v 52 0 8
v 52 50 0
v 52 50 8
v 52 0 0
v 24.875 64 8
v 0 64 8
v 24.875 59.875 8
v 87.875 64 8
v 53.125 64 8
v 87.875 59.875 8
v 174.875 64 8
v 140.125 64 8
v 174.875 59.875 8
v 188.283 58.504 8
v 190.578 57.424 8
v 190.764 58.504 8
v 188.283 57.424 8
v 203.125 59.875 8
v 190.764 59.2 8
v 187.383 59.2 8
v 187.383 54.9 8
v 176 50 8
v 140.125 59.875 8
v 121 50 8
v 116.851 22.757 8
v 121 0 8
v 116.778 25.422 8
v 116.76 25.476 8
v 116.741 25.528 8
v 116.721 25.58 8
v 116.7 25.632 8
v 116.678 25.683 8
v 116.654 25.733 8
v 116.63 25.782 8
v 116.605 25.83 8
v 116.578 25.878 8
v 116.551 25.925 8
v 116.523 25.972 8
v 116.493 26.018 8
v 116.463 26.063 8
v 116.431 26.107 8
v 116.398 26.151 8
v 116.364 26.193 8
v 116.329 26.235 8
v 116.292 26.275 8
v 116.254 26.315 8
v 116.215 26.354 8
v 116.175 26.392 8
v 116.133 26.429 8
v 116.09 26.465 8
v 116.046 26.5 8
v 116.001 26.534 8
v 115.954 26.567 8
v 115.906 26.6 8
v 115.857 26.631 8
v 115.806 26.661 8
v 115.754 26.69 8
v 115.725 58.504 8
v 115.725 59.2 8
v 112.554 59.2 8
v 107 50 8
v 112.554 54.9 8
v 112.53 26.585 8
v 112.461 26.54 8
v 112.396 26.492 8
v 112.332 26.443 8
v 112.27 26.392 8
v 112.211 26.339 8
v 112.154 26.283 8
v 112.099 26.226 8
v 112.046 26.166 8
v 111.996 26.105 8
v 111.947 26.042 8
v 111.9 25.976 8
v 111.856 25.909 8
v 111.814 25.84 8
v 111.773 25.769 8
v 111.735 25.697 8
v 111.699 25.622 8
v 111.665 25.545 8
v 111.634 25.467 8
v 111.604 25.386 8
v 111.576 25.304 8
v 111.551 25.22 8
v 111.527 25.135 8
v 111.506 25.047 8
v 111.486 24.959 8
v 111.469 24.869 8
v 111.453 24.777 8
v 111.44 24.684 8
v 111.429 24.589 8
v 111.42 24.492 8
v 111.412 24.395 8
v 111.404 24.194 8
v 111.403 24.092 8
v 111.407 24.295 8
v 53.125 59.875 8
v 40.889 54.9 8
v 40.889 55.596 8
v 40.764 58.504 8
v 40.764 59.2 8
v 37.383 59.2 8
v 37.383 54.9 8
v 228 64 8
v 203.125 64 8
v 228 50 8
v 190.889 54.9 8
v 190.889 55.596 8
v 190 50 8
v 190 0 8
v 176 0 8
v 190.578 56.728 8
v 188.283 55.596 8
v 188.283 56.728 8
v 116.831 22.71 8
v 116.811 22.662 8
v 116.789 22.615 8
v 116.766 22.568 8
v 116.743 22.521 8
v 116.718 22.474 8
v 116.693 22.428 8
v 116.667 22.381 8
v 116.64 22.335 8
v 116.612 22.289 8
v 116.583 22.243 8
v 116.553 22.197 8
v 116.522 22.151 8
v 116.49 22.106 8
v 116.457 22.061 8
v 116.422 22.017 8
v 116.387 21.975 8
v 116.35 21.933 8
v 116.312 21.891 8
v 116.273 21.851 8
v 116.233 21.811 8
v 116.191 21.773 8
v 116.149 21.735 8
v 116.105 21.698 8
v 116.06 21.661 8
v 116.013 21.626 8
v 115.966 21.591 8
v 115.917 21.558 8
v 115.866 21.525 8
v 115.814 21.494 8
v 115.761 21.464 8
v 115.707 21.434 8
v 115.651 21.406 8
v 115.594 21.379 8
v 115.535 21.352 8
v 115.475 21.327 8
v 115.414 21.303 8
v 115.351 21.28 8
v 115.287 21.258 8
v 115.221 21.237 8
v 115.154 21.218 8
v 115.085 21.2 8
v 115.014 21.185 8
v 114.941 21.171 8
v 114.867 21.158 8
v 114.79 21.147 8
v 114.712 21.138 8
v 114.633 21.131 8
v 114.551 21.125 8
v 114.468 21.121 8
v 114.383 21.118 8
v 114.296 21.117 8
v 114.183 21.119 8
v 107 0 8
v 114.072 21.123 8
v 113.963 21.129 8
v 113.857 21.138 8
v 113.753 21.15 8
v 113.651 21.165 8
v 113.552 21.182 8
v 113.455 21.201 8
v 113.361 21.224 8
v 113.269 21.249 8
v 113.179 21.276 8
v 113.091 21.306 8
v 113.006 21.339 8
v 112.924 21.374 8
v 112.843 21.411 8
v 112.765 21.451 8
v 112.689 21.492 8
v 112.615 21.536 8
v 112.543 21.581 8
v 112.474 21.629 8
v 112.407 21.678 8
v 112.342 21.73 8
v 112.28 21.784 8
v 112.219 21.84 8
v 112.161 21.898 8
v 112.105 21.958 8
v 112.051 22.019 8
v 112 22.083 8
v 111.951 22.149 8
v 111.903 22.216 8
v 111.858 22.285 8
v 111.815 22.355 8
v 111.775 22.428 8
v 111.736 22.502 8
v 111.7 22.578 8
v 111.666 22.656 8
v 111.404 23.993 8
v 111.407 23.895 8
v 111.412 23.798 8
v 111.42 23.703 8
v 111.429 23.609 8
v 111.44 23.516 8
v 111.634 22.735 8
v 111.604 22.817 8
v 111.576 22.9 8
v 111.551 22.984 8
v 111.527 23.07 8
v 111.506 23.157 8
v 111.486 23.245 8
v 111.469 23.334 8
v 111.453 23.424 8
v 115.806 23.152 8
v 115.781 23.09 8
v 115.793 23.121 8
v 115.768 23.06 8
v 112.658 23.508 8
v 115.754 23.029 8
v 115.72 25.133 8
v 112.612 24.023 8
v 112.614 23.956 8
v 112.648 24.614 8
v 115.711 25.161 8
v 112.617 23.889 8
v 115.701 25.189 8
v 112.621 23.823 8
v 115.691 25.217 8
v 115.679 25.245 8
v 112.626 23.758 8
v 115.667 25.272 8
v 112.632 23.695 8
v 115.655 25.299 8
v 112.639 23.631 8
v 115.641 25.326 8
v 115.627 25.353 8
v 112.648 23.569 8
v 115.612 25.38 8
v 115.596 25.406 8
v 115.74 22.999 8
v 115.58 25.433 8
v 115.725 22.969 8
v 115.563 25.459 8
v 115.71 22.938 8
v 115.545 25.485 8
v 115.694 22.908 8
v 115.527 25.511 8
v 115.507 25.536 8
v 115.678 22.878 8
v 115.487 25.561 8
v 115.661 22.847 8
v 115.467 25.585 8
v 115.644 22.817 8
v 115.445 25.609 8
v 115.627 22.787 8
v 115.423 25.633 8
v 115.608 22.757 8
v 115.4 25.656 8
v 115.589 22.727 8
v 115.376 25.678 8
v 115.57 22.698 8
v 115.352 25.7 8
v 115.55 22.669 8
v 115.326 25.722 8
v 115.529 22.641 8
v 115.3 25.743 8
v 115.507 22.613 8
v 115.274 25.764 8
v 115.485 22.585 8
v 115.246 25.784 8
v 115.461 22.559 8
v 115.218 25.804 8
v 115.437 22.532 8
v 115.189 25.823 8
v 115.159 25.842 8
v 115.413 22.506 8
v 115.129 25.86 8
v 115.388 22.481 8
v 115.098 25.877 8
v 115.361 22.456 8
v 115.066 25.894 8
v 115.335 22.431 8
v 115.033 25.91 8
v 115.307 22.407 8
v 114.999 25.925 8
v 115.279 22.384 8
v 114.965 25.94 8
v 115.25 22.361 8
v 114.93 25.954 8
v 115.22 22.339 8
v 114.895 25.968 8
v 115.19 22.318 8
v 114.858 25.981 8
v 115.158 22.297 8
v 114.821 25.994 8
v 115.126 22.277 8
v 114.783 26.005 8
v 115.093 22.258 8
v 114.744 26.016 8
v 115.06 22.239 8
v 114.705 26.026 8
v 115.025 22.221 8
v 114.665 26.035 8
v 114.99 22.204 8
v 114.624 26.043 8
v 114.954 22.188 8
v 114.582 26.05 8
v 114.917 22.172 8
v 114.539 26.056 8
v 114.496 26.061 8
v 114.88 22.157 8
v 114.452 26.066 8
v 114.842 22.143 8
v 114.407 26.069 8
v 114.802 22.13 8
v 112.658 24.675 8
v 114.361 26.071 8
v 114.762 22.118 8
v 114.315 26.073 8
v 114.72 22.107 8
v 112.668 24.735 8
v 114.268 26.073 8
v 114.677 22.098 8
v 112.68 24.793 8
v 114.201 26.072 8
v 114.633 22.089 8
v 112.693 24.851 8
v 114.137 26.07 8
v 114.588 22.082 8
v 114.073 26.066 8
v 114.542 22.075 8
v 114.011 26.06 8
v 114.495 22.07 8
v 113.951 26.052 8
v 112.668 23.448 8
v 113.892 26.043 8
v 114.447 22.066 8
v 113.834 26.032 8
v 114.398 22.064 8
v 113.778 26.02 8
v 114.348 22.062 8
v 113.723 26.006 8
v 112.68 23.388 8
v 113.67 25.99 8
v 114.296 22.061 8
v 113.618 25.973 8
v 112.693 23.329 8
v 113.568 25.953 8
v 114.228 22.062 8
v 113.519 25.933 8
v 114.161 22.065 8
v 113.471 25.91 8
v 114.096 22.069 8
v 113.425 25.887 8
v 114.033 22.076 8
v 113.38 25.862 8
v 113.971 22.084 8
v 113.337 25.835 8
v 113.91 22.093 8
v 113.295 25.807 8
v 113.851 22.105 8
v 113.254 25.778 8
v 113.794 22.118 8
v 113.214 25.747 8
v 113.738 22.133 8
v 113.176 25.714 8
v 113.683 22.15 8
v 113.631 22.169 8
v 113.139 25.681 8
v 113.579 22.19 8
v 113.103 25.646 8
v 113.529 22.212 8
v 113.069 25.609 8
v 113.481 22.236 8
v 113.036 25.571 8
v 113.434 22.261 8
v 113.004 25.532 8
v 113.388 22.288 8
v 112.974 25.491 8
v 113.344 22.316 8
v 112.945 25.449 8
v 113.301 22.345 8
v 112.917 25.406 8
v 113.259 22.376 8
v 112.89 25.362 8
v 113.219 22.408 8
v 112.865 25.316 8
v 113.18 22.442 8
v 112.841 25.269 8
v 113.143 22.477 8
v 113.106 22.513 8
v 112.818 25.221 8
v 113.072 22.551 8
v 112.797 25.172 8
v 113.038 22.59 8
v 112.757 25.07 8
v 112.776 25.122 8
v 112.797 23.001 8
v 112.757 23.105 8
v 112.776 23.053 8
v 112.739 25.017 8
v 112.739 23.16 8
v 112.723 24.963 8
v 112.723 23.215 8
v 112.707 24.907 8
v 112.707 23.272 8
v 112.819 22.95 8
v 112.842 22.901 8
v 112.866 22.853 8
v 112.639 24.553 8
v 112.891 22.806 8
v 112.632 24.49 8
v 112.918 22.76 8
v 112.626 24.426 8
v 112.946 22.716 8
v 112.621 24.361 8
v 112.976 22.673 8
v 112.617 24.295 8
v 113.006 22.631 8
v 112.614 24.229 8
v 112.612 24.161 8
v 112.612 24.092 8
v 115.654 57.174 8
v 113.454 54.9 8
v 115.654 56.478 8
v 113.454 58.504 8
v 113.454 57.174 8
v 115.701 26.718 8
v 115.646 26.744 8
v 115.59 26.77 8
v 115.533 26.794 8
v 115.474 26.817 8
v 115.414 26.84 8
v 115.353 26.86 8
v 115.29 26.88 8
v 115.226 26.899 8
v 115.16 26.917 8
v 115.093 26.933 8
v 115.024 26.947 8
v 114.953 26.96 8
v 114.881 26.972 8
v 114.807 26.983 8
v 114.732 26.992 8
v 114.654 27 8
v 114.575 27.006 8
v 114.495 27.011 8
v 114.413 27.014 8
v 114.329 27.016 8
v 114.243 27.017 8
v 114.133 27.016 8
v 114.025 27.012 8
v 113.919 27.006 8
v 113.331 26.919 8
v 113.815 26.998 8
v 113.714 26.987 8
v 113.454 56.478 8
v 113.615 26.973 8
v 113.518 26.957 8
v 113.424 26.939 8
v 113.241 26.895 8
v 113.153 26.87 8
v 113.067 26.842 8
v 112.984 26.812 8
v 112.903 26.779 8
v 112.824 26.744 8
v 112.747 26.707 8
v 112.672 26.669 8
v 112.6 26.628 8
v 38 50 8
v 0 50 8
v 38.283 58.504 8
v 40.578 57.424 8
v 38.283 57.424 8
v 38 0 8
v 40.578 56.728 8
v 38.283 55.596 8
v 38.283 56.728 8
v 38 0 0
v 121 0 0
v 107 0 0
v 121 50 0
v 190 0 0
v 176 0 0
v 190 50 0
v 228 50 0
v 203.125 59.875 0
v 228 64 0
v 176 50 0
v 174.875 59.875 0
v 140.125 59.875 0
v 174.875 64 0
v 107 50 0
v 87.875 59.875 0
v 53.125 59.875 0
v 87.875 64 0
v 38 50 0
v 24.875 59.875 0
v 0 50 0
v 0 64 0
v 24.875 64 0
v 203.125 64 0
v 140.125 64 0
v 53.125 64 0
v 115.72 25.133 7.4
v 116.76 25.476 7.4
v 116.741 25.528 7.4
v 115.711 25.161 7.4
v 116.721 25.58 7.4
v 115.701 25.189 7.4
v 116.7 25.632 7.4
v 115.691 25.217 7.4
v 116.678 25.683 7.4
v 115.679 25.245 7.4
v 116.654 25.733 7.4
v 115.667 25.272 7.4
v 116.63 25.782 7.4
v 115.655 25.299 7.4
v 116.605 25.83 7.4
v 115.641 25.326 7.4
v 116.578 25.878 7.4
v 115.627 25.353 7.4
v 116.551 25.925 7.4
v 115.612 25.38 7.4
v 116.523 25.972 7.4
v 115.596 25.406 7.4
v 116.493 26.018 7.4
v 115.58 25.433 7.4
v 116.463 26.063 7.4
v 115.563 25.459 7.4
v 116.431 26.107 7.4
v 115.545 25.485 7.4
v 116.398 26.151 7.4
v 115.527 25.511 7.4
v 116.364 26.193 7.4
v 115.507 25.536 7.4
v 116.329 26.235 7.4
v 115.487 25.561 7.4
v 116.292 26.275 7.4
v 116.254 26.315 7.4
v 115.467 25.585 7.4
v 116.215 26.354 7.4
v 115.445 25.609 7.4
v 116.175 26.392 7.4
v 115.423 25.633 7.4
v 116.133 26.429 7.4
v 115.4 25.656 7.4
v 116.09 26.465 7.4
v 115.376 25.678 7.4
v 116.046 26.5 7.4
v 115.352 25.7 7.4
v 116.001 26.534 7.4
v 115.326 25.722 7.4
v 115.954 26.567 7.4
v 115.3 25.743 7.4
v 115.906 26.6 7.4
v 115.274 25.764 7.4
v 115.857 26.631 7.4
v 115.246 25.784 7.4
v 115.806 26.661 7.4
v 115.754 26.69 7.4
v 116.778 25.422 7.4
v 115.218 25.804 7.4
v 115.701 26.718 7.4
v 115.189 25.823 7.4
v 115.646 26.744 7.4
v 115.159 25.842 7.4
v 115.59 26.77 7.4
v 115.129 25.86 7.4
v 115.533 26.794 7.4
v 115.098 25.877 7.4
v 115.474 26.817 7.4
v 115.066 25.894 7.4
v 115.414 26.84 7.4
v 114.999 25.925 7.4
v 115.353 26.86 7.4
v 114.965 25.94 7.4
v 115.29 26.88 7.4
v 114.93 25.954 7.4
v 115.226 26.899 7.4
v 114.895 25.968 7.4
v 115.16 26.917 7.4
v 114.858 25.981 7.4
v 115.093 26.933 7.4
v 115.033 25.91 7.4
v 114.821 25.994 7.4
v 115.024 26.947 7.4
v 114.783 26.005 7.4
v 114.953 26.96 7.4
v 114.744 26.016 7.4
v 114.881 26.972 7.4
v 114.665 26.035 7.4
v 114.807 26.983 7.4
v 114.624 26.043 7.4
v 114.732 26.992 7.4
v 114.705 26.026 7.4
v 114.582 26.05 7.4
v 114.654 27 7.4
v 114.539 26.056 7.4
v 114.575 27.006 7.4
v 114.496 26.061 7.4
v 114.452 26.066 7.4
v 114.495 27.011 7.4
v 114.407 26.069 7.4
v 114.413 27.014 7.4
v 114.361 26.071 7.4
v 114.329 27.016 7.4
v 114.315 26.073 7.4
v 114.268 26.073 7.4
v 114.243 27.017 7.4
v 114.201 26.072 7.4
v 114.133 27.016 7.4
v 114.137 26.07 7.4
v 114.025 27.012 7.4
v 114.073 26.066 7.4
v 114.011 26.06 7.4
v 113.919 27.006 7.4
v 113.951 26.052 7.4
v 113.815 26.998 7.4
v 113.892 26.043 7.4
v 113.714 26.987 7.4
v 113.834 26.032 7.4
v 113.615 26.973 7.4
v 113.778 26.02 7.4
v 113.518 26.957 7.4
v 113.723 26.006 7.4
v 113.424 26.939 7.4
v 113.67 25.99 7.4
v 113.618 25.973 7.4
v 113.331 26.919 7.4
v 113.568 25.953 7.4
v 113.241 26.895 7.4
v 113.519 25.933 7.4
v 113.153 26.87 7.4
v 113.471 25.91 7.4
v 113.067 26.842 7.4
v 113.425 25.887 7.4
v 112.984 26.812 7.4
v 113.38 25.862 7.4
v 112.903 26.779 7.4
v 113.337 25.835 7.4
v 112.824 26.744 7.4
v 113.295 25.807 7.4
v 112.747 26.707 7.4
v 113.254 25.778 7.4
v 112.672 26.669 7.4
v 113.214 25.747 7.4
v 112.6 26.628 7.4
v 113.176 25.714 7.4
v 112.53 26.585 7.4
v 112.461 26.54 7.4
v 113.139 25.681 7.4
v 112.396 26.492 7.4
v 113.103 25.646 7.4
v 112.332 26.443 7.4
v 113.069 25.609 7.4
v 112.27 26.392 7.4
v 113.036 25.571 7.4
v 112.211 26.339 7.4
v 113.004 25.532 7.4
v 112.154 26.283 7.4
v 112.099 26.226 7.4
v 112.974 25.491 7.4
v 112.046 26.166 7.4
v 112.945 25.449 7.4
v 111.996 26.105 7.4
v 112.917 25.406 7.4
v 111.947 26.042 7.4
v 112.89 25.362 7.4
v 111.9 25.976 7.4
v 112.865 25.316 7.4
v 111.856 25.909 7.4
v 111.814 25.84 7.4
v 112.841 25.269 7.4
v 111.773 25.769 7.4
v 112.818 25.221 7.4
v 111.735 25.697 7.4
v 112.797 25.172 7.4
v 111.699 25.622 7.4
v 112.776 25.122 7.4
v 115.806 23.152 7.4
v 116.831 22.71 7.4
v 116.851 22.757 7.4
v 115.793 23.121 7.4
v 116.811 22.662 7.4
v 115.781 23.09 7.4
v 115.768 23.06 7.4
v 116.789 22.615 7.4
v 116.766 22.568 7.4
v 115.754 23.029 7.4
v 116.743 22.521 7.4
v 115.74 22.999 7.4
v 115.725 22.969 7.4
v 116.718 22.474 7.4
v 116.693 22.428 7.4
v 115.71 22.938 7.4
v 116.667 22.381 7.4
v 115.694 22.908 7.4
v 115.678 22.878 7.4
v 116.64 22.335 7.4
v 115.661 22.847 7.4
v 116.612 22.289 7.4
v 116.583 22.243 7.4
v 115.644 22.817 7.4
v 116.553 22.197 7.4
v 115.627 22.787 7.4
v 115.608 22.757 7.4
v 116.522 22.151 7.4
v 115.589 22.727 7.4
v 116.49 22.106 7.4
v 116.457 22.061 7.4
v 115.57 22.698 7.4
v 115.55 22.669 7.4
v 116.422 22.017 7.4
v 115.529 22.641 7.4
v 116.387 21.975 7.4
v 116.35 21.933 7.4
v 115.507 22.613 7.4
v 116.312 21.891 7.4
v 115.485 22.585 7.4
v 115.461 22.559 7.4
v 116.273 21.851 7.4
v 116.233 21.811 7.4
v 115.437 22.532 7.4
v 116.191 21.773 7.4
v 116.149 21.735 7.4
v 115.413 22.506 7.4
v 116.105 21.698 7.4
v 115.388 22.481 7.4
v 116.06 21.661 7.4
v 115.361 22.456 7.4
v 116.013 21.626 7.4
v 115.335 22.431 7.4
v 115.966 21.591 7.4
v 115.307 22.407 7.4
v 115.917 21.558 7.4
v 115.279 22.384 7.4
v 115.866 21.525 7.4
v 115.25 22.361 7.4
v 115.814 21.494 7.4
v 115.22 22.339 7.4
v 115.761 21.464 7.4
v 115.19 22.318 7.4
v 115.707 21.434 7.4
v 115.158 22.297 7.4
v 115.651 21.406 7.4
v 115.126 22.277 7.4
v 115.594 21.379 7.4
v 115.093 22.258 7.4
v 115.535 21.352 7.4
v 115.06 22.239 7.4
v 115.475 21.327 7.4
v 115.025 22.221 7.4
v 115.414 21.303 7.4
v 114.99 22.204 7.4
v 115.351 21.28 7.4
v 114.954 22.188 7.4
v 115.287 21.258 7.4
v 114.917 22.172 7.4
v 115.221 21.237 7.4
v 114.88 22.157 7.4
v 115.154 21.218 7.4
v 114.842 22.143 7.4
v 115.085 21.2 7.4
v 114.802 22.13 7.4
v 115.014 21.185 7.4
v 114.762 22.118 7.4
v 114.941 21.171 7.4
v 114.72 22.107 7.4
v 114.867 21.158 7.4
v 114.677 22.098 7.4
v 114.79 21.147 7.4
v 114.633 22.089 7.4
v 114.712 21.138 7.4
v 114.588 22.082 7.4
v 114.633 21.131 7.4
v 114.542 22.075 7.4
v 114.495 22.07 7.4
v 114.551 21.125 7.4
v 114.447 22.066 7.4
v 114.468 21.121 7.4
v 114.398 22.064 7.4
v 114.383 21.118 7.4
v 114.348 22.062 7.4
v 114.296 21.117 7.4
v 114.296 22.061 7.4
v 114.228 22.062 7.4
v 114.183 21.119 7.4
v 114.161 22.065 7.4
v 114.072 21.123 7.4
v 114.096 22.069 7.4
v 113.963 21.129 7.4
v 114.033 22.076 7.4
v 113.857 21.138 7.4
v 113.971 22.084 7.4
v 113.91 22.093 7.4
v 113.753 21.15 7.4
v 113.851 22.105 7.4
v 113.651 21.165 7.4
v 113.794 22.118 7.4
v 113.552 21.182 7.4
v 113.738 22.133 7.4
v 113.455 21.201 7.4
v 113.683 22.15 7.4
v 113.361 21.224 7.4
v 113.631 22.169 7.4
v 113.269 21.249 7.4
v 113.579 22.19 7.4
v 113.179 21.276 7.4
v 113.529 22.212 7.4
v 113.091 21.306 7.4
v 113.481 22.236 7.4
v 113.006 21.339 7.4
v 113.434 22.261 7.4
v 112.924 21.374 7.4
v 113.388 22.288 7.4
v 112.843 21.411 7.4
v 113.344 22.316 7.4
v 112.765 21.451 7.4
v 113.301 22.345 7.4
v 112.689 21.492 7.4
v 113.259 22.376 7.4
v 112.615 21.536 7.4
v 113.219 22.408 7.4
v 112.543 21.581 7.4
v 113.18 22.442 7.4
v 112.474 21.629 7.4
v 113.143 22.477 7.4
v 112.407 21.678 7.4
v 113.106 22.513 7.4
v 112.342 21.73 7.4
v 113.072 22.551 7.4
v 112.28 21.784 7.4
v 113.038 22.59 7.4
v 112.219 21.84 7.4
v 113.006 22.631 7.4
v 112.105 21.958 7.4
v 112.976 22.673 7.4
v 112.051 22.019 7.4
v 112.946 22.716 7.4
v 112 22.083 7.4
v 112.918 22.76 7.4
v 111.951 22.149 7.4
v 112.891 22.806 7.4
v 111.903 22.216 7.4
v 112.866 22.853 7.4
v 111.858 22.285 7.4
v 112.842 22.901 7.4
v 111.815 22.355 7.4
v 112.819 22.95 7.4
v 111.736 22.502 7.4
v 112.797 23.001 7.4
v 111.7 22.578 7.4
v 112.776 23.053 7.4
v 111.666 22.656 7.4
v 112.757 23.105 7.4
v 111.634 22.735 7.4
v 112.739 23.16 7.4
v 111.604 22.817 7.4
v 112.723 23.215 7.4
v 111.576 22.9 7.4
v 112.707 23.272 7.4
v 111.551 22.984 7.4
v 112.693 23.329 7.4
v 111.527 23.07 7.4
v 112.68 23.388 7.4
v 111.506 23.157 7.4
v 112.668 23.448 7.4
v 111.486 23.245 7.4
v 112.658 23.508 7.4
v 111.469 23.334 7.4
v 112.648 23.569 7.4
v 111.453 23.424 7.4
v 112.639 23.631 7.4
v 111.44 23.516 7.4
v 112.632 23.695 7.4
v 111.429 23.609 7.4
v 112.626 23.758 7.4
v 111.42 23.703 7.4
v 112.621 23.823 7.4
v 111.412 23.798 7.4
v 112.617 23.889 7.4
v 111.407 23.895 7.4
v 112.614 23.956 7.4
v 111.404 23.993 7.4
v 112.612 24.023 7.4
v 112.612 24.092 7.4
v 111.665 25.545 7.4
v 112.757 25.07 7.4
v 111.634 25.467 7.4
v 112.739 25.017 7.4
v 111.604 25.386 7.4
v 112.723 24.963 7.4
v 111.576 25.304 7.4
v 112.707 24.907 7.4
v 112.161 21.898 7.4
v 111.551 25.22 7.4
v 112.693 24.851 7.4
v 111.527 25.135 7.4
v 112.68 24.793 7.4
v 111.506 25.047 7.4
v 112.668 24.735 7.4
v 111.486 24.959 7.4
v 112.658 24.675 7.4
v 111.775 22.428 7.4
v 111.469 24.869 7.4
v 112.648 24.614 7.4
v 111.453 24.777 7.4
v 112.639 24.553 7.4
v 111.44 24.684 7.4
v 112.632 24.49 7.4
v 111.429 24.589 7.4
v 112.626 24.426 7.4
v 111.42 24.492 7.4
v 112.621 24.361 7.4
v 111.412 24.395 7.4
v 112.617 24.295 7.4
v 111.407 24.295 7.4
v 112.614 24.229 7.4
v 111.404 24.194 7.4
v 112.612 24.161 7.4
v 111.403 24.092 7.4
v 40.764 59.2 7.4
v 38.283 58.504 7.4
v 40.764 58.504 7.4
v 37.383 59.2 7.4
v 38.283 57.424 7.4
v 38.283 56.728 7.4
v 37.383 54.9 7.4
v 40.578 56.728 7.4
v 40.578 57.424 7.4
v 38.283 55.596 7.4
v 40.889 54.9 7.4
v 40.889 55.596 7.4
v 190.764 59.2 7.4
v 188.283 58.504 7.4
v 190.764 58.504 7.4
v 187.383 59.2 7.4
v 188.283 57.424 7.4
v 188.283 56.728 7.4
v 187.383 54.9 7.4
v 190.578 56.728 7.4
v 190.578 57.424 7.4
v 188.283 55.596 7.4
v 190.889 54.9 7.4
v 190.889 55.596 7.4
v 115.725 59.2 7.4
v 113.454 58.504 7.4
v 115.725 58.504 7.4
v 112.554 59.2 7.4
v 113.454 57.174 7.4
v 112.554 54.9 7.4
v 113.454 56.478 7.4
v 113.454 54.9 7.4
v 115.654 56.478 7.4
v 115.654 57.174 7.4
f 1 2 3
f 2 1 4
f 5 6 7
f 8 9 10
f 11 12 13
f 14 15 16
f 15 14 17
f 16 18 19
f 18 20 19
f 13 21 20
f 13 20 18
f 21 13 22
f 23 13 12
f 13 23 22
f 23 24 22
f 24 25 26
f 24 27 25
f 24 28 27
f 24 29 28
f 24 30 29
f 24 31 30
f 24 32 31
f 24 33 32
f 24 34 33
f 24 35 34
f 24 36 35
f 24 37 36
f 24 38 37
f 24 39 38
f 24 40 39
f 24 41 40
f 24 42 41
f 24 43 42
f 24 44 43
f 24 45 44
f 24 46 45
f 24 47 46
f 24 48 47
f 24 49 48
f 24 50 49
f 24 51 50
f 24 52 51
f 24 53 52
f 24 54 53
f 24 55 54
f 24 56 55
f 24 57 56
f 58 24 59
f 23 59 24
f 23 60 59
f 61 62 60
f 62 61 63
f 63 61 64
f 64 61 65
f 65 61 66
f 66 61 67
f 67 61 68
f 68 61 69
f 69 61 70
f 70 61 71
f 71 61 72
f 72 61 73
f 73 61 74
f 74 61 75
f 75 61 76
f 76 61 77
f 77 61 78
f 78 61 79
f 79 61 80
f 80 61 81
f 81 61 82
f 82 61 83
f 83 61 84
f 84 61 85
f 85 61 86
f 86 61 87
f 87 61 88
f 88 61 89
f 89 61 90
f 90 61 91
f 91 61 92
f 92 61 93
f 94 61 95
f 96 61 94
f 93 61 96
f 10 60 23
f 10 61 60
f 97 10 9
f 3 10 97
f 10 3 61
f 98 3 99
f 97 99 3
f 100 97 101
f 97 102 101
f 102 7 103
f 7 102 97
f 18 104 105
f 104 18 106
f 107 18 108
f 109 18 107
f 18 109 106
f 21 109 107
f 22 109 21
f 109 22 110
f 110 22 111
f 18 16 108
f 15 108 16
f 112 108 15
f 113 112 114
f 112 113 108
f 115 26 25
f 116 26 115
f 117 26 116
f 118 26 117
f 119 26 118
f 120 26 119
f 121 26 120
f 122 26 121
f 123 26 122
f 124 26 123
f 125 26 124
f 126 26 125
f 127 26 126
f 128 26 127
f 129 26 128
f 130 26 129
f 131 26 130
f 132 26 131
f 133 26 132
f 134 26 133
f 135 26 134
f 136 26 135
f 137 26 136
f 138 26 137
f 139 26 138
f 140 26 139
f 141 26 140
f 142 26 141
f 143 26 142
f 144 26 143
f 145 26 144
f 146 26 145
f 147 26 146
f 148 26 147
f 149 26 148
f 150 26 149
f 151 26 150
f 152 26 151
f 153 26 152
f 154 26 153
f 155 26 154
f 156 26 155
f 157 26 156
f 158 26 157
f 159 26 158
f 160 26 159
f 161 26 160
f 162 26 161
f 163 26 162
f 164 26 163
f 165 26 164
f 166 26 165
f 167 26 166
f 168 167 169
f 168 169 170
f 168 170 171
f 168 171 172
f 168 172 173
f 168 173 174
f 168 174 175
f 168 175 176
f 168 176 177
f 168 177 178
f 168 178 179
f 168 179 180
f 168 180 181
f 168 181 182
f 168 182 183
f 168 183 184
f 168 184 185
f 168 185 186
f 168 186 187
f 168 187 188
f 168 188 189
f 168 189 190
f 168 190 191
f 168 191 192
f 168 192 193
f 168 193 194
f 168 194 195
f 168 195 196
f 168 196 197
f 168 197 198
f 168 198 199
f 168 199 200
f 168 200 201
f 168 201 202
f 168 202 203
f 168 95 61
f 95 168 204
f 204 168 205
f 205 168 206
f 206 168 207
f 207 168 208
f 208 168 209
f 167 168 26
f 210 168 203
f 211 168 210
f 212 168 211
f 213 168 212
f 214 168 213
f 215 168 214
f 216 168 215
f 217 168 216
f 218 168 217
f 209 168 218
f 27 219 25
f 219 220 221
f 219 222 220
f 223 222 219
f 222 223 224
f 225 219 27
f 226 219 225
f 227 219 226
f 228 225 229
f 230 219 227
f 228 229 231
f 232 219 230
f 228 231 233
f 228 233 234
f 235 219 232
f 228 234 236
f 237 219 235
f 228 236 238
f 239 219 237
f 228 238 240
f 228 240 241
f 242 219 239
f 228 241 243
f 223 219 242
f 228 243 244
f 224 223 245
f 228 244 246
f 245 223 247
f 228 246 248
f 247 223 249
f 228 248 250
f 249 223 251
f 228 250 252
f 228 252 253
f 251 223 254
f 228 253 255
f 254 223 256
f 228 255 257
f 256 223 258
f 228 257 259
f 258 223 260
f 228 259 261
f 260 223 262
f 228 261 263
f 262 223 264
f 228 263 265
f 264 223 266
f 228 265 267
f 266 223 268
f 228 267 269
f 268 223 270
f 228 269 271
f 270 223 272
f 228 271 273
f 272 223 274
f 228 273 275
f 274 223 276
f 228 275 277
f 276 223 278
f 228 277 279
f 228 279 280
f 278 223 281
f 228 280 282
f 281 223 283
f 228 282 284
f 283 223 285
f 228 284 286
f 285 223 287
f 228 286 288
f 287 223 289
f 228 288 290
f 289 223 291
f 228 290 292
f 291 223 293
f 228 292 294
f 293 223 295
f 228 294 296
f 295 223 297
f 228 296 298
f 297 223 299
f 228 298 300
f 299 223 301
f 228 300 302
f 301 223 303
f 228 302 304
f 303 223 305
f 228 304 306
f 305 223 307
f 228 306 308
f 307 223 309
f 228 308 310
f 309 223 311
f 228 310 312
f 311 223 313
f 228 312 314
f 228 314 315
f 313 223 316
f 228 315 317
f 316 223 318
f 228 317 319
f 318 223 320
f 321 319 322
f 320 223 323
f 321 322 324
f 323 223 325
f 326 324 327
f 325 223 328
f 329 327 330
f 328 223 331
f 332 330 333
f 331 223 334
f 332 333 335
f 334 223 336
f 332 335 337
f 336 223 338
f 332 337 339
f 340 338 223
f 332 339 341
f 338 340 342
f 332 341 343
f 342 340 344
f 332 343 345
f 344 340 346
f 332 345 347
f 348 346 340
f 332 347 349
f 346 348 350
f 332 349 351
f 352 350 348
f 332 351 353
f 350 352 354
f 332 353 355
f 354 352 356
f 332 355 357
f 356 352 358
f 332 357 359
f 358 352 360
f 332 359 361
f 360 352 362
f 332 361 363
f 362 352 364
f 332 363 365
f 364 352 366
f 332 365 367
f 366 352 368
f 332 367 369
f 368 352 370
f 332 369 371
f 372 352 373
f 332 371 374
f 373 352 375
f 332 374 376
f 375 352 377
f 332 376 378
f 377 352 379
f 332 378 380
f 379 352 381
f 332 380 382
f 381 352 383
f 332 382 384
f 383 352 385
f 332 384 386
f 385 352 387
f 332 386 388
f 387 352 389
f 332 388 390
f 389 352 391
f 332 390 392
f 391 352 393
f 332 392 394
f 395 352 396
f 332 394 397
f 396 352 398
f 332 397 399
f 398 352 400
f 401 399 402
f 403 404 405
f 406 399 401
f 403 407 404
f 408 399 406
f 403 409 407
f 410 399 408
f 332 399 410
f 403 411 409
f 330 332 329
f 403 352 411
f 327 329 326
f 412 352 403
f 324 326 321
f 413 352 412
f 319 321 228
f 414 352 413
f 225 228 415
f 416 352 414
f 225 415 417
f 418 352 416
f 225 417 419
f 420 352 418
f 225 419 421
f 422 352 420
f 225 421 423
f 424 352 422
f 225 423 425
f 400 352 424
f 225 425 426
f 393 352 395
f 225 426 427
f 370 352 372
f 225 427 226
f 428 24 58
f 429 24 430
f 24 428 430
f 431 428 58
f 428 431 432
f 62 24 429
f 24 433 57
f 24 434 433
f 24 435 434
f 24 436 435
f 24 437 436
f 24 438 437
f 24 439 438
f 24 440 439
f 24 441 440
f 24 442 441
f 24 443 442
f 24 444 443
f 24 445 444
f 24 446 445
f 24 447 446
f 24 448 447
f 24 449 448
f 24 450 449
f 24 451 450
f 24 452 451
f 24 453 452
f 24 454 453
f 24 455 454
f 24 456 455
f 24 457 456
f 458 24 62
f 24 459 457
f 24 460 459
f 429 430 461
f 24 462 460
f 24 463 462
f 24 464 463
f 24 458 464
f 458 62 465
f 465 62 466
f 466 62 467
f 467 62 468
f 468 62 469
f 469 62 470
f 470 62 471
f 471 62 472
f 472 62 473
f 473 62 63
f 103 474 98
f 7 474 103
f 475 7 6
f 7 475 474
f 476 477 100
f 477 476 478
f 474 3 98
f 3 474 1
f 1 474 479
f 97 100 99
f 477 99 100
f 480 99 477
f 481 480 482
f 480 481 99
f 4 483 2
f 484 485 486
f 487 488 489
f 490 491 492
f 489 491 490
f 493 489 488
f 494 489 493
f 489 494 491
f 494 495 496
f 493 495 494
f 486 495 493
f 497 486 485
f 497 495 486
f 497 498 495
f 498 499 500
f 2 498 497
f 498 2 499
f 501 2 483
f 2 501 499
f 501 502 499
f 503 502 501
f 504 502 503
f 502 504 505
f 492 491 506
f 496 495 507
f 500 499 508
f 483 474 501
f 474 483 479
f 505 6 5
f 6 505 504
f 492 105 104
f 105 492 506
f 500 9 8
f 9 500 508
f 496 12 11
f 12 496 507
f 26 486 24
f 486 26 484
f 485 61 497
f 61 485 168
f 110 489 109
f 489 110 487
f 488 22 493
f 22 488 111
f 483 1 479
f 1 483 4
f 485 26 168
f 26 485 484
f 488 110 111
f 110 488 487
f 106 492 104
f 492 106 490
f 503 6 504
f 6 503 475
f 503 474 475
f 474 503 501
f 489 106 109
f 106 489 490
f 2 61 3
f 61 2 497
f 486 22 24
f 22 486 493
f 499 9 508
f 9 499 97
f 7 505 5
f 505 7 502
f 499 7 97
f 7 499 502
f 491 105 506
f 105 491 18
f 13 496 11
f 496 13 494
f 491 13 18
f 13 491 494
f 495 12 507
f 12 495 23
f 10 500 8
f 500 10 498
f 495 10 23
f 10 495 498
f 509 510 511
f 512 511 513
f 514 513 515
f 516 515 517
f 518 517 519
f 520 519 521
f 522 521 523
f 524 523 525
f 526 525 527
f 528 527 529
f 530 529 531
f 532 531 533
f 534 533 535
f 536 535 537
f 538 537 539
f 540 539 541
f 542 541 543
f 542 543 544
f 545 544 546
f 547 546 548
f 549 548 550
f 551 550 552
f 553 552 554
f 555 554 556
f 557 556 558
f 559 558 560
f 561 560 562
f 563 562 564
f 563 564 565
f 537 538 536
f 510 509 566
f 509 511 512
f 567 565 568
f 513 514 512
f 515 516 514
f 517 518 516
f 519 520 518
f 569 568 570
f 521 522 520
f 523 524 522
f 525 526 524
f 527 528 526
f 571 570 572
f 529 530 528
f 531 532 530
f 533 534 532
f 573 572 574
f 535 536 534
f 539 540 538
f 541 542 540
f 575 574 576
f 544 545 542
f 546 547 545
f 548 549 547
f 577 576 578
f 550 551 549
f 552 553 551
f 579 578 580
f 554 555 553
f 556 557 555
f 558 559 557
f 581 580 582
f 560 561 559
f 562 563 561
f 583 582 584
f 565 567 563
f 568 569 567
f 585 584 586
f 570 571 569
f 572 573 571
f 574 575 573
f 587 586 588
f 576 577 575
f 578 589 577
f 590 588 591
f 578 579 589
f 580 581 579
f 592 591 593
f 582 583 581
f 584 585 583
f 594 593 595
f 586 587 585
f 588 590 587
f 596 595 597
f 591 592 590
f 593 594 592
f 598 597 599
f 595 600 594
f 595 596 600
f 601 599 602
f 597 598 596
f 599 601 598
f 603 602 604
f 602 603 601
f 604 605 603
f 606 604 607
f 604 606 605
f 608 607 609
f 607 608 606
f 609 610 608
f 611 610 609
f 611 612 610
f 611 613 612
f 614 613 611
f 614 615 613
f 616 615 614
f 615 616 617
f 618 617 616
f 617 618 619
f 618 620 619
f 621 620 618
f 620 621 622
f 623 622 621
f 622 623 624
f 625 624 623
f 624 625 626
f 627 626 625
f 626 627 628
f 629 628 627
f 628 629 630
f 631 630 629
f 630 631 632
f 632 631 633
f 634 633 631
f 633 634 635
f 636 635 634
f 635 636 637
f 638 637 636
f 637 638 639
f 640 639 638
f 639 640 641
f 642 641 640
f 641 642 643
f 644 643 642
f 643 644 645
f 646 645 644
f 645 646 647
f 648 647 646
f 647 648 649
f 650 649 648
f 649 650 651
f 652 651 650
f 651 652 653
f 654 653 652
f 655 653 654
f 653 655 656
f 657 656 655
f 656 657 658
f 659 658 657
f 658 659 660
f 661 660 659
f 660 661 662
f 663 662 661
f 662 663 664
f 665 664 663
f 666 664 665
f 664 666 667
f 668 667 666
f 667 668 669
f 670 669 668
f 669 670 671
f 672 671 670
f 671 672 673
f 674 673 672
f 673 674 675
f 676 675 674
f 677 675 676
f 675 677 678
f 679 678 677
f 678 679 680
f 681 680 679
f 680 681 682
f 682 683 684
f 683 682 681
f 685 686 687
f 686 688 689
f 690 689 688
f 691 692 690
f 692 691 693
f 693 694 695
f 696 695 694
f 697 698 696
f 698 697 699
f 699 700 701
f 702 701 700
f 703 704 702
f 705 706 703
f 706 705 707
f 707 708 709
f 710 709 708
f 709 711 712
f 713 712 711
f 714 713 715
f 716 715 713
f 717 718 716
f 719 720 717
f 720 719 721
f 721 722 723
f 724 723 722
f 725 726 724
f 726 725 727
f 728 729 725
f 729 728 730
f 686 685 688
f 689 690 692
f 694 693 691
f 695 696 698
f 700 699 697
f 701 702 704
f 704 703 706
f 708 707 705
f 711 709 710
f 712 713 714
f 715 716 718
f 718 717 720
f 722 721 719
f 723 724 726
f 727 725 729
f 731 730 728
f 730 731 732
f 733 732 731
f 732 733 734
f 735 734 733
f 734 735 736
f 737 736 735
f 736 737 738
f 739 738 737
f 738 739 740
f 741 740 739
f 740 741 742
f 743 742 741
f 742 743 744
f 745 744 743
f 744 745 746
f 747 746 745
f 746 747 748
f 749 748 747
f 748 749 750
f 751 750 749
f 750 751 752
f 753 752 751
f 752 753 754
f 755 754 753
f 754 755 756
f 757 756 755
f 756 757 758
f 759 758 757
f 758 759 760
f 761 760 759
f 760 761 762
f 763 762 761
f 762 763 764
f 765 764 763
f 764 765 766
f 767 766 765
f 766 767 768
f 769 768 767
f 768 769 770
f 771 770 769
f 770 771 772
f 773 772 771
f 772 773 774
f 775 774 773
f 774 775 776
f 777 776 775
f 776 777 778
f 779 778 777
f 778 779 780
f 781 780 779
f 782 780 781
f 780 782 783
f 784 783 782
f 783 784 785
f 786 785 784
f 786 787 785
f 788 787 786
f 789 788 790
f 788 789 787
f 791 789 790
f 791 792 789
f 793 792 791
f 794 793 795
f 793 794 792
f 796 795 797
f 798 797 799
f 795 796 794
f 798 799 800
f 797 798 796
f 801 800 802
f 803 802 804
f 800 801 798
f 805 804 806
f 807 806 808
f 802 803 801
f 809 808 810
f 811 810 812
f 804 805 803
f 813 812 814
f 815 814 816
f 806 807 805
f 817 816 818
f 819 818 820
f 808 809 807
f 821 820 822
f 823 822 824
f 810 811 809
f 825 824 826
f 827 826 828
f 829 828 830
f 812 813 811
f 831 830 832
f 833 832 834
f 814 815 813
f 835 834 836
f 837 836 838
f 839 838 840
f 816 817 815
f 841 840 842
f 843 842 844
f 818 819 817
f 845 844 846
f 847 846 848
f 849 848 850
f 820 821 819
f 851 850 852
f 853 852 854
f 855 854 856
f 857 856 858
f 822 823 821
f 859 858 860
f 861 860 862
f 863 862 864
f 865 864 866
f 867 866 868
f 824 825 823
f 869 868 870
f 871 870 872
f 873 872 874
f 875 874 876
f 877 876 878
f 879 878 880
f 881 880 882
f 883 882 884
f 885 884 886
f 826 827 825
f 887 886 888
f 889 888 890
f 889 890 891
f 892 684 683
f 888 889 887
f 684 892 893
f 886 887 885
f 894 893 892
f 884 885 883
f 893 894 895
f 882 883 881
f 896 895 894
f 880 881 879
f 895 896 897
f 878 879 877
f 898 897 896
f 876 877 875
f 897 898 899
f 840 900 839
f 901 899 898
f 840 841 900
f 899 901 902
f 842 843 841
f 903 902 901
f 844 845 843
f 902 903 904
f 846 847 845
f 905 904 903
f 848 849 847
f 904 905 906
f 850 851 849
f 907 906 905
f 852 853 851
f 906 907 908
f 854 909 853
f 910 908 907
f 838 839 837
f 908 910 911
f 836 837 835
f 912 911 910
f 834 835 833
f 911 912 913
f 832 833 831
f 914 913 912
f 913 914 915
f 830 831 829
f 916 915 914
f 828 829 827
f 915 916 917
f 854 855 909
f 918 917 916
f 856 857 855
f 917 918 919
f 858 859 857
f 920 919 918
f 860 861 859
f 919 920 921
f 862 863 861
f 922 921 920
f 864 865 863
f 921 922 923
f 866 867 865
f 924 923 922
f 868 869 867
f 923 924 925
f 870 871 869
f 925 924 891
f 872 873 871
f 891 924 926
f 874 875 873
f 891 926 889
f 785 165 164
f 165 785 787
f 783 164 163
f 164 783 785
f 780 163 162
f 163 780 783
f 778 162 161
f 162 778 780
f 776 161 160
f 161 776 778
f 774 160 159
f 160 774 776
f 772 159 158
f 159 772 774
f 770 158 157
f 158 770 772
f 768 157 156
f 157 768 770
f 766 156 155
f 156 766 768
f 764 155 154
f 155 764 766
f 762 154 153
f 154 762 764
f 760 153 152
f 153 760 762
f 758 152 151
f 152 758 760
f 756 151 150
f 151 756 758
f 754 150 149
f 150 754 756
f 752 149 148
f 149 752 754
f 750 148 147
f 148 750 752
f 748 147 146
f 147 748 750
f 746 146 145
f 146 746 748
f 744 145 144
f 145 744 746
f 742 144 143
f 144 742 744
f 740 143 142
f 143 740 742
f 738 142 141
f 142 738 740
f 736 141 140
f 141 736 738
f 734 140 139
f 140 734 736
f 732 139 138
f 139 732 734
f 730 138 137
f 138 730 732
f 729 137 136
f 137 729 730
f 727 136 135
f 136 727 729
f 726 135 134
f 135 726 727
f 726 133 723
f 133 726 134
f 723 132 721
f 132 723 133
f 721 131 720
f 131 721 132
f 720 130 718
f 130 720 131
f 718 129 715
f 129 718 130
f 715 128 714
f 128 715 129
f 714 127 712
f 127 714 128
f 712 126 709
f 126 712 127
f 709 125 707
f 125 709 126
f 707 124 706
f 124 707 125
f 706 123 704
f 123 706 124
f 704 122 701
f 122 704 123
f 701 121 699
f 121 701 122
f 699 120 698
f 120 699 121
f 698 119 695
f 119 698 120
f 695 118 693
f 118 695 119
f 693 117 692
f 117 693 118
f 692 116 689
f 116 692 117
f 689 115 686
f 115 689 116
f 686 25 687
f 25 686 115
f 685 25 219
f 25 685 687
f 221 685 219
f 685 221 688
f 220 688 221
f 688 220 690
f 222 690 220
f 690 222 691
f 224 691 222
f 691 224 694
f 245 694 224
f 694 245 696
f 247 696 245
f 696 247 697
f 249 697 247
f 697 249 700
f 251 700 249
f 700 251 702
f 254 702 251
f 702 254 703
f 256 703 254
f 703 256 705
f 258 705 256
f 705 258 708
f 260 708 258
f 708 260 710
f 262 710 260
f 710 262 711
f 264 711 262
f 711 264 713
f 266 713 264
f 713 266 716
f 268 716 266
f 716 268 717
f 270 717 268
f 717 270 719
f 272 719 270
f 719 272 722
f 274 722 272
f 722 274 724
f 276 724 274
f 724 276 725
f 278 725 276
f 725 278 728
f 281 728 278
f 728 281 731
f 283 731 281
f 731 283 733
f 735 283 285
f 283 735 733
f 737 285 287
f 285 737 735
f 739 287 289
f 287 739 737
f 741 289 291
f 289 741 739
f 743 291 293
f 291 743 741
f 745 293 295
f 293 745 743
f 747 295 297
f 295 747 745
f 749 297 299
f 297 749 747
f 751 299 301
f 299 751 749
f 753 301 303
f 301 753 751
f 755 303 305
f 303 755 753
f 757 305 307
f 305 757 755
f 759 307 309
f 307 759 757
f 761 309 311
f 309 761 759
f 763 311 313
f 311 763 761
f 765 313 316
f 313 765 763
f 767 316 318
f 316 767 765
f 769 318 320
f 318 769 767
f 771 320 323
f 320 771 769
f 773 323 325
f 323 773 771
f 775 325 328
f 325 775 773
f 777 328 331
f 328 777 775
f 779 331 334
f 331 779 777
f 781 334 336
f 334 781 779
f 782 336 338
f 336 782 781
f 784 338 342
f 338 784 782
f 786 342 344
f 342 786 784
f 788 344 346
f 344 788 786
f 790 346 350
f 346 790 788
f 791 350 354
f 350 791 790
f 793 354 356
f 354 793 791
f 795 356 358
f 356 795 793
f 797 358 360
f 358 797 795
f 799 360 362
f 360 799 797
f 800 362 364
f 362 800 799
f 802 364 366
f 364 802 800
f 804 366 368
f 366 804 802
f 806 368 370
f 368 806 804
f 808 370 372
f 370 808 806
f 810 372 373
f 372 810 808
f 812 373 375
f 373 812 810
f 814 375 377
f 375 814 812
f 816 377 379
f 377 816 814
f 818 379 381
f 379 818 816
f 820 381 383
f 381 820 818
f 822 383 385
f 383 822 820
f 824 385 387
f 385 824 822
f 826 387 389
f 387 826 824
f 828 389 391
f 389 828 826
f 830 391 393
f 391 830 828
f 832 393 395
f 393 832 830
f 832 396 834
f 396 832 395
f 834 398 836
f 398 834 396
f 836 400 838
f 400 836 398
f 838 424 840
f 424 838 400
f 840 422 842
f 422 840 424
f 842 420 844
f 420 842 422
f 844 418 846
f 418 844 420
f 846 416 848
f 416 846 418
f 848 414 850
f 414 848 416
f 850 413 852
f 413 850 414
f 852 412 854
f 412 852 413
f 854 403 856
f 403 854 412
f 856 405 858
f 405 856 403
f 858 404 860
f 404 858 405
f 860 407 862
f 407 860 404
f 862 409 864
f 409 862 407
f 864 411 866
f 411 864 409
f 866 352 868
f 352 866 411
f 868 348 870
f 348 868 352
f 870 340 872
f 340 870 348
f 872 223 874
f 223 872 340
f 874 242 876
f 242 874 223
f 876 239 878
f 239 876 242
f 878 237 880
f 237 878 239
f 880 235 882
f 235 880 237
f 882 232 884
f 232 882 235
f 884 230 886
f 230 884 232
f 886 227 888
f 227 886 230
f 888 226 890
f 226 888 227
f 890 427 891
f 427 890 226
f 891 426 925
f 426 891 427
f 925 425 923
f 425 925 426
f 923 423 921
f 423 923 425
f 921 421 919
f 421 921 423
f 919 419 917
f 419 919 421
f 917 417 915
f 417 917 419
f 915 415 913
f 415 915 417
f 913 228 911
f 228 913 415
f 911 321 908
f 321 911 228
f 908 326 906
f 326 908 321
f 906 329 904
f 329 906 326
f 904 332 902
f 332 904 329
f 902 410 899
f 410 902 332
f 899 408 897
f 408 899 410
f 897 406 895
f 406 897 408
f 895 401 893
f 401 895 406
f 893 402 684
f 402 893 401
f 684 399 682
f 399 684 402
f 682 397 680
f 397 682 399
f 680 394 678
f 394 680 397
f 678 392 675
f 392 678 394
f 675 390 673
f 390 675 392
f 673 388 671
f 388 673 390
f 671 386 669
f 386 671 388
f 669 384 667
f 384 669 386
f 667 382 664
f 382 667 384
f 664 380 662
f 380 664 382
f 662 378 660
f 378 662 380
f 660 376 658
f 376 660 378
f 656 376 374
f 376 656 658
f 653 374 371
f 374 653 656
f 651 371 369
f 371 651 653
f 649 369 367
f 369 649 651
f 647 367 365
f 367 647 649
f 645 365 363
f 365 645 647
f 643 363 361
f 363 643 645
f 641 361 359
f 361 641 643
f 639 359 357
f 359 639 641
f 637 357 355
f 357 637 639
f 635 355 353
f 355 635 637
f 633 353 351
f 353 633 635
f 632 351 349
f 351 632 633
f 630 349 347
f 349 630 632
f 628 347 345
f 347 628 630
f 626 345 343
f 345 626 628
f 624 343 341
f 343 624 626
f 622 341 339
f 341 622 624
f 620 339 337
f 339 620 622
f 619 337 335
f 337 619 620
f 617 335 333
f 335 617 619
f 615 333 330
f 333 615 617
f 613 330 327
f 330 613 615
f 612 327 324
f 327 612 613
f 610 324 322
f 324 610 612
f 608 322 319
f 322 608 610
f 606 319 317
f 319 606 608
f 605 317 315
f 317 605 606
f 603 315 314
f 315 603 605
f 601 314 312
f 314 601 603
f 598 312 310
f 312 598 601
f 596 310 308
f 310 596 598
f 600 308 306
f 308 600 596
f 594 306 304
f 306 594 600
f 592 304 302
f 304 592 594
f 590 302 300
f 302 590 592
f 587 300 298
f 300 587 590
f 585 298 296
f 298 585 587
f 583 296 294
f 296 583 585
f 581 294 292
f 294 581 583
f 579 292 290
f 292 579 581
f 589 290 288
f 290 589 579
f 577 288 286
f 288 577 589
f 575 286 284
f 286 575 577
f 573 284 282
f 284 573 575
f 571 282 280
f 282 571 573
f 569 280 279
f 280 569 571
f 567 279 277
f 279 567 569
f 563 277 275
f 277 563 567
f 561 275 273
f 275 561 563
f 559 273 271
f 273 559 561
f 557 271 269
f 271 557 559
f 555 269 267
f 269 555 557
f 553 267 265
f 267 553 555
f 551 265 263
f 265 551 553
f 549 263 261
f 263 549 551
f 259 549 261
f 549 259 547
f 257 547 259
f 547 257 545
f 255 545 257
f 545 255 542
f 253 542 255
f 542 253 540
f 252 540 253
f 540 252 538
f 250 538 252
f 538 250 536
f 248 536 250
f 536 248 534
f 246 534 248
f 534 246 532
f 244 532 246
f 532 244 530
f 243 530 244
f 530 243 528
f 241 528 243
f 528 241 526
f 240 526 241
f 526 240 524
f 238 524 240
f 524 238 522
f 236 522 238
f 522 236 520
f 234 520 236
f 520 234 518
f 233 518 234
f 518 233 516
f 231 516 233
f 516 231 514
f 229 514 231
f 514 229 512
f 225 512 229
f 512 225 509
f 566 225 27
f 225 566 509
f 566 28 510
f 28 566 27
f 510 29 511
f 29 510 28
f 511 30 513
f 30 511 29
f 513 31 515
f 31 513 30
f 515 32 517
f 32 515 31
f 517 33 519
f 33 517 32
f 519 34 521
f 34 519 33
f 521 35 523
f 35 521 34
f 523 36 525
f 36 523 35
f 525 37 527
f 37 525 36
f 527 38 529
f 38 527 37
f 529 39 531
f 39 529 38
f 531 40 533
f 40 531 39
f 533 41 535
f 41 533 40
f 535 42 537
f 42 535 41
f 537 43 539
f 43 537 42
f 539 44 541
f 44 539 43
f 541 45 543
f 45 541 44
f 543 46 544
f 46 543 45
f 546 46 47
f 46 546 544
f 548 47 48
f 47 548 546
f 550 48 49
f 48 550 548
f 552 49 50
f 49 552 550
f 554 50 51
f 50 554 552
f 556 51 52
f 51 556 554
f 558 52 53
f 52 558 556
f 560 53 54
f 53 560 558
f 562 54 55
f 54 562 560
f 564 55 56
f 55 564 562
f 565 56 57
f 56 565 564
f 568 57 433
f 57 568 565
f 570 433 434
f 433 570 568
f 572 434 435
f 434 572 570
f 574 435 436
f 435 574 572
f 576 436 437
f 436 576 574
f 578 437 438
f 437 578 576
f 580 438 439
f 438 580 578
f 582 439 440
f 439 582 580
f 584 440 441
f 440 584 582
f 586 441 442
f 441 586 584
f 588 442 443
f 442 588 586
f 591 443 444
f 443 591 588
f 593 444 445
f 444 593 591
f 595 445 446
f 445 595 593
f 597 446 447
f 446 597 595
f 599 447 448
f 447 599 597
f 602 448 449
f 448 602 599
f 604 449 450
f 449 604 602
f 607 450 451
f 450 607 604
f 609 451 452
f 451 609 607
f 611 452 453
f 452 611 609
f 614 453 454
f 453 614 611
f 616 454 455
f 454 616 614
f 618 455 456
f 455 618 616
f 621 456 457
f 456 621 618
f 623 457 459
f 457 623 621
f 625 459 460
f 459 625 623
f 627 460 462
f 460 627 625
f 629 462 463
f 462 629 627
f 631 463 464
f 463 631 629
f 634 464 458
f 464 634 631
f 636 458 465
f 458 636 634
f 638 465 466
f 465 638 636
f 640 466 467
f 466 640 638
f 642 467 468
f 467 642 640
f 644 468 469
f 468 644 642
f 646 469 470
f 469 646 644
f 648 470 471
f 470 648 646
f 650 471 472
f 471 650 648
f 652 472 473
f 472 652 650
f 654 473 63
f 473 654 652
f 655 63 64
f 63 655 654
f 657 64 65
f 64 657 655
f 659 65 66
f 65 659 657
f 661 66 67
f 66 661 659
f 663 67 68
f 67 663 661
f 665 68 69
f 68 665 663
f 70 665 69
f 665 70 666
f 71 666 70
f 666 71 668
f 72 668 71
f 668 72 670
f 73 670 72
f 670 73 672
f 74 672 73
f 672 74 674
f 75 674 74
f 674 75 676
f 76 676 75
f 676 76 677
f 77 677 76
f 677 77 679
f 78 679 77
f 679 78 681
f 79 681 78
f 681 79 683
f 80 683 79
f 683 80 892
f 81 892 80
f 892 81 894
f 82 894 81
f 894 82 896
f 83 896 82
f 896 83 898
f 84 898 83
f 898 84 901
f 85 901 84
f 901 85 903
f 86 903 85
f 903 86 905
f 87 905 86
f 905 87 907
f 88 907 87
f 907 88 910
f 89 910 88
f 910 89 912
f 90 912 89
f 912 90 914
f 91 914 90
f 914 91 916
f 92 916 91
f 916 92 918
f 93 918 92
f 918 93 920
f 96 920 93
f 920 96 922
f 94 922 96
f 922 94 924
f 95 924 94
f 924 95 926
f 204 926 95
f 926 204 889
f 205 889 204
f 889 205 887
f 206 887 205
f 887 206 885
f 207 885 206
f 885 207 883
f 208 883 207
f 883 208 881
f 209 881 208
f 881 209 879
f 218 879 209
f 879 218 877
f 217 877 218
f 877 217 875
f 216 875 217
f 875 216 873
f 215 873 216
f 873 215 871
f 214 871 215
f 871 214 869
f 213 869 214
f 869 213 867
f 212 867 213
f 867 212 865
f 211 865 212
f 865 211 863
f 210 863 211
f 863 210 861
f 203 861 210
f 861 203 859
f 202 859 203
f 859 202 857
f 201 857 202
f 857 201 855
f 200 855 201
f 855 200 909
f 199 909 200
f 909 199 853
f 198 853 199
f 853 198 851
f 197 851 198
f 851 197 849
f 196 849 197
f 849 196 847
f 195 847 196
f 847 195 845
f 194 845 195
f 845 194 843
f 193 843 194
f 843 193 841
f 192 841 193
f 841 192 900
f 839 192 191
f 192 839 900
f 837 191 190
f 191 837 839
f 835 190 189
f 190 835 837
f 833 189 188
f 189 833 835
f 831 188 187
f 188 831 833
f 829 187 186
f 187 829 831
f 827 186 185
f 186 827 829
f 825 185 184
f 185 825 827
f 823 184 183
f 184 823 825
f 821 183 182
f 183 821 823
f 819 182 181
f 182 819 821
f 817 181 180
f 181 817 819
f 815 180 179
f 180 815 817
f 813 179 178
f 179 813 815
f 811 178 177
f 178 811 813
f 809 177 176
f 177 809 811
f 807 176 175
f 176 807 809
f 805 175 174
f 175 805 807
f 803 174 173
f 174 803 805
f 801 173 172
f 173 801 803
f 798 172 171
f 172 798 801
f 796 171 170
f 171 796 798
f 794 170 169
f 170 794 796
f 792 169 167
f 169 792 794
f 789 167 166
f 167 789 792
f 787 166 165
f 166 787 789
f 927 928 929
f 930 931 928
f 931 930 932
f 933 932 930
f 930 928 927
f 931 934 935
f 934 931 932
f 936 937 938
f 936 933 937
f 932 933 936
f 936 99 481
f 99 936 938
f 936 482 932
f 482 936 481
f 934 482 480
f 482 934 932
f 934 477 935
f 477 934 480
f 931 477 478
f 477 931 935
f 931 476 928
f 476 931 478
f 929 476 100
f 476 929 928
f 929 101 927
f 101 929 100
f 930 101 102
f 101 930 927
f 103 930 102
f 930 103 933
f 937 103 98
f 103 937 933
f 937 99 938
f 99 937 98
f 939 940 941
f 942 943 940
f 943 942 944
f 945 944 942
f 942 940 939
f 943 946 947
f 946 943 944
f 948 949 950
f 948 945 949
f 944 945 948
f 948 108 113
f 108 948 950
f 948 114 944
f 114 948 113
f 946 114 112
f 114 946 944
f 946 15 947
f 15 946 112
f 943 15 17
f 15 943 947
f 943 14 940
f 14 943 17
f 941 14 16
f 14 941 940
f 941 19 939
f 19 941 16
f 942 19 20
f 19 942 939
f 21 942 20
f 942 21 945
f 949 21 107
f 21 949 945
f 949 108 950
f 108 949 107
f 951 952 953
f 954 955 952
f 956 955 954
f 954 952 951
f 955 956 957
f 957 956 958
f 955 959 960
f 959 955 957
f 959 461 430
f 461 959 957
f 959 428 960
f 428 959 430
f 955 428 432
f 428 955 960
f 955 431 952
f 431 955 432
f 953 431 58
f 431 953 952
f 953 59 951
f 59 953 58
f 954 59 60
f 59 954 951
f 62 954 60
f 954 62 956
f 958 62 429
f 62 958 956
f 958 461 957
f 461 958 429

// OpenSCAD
use <../../../tec_cold_block_mockup.scad>

support_rear_deck_export();
